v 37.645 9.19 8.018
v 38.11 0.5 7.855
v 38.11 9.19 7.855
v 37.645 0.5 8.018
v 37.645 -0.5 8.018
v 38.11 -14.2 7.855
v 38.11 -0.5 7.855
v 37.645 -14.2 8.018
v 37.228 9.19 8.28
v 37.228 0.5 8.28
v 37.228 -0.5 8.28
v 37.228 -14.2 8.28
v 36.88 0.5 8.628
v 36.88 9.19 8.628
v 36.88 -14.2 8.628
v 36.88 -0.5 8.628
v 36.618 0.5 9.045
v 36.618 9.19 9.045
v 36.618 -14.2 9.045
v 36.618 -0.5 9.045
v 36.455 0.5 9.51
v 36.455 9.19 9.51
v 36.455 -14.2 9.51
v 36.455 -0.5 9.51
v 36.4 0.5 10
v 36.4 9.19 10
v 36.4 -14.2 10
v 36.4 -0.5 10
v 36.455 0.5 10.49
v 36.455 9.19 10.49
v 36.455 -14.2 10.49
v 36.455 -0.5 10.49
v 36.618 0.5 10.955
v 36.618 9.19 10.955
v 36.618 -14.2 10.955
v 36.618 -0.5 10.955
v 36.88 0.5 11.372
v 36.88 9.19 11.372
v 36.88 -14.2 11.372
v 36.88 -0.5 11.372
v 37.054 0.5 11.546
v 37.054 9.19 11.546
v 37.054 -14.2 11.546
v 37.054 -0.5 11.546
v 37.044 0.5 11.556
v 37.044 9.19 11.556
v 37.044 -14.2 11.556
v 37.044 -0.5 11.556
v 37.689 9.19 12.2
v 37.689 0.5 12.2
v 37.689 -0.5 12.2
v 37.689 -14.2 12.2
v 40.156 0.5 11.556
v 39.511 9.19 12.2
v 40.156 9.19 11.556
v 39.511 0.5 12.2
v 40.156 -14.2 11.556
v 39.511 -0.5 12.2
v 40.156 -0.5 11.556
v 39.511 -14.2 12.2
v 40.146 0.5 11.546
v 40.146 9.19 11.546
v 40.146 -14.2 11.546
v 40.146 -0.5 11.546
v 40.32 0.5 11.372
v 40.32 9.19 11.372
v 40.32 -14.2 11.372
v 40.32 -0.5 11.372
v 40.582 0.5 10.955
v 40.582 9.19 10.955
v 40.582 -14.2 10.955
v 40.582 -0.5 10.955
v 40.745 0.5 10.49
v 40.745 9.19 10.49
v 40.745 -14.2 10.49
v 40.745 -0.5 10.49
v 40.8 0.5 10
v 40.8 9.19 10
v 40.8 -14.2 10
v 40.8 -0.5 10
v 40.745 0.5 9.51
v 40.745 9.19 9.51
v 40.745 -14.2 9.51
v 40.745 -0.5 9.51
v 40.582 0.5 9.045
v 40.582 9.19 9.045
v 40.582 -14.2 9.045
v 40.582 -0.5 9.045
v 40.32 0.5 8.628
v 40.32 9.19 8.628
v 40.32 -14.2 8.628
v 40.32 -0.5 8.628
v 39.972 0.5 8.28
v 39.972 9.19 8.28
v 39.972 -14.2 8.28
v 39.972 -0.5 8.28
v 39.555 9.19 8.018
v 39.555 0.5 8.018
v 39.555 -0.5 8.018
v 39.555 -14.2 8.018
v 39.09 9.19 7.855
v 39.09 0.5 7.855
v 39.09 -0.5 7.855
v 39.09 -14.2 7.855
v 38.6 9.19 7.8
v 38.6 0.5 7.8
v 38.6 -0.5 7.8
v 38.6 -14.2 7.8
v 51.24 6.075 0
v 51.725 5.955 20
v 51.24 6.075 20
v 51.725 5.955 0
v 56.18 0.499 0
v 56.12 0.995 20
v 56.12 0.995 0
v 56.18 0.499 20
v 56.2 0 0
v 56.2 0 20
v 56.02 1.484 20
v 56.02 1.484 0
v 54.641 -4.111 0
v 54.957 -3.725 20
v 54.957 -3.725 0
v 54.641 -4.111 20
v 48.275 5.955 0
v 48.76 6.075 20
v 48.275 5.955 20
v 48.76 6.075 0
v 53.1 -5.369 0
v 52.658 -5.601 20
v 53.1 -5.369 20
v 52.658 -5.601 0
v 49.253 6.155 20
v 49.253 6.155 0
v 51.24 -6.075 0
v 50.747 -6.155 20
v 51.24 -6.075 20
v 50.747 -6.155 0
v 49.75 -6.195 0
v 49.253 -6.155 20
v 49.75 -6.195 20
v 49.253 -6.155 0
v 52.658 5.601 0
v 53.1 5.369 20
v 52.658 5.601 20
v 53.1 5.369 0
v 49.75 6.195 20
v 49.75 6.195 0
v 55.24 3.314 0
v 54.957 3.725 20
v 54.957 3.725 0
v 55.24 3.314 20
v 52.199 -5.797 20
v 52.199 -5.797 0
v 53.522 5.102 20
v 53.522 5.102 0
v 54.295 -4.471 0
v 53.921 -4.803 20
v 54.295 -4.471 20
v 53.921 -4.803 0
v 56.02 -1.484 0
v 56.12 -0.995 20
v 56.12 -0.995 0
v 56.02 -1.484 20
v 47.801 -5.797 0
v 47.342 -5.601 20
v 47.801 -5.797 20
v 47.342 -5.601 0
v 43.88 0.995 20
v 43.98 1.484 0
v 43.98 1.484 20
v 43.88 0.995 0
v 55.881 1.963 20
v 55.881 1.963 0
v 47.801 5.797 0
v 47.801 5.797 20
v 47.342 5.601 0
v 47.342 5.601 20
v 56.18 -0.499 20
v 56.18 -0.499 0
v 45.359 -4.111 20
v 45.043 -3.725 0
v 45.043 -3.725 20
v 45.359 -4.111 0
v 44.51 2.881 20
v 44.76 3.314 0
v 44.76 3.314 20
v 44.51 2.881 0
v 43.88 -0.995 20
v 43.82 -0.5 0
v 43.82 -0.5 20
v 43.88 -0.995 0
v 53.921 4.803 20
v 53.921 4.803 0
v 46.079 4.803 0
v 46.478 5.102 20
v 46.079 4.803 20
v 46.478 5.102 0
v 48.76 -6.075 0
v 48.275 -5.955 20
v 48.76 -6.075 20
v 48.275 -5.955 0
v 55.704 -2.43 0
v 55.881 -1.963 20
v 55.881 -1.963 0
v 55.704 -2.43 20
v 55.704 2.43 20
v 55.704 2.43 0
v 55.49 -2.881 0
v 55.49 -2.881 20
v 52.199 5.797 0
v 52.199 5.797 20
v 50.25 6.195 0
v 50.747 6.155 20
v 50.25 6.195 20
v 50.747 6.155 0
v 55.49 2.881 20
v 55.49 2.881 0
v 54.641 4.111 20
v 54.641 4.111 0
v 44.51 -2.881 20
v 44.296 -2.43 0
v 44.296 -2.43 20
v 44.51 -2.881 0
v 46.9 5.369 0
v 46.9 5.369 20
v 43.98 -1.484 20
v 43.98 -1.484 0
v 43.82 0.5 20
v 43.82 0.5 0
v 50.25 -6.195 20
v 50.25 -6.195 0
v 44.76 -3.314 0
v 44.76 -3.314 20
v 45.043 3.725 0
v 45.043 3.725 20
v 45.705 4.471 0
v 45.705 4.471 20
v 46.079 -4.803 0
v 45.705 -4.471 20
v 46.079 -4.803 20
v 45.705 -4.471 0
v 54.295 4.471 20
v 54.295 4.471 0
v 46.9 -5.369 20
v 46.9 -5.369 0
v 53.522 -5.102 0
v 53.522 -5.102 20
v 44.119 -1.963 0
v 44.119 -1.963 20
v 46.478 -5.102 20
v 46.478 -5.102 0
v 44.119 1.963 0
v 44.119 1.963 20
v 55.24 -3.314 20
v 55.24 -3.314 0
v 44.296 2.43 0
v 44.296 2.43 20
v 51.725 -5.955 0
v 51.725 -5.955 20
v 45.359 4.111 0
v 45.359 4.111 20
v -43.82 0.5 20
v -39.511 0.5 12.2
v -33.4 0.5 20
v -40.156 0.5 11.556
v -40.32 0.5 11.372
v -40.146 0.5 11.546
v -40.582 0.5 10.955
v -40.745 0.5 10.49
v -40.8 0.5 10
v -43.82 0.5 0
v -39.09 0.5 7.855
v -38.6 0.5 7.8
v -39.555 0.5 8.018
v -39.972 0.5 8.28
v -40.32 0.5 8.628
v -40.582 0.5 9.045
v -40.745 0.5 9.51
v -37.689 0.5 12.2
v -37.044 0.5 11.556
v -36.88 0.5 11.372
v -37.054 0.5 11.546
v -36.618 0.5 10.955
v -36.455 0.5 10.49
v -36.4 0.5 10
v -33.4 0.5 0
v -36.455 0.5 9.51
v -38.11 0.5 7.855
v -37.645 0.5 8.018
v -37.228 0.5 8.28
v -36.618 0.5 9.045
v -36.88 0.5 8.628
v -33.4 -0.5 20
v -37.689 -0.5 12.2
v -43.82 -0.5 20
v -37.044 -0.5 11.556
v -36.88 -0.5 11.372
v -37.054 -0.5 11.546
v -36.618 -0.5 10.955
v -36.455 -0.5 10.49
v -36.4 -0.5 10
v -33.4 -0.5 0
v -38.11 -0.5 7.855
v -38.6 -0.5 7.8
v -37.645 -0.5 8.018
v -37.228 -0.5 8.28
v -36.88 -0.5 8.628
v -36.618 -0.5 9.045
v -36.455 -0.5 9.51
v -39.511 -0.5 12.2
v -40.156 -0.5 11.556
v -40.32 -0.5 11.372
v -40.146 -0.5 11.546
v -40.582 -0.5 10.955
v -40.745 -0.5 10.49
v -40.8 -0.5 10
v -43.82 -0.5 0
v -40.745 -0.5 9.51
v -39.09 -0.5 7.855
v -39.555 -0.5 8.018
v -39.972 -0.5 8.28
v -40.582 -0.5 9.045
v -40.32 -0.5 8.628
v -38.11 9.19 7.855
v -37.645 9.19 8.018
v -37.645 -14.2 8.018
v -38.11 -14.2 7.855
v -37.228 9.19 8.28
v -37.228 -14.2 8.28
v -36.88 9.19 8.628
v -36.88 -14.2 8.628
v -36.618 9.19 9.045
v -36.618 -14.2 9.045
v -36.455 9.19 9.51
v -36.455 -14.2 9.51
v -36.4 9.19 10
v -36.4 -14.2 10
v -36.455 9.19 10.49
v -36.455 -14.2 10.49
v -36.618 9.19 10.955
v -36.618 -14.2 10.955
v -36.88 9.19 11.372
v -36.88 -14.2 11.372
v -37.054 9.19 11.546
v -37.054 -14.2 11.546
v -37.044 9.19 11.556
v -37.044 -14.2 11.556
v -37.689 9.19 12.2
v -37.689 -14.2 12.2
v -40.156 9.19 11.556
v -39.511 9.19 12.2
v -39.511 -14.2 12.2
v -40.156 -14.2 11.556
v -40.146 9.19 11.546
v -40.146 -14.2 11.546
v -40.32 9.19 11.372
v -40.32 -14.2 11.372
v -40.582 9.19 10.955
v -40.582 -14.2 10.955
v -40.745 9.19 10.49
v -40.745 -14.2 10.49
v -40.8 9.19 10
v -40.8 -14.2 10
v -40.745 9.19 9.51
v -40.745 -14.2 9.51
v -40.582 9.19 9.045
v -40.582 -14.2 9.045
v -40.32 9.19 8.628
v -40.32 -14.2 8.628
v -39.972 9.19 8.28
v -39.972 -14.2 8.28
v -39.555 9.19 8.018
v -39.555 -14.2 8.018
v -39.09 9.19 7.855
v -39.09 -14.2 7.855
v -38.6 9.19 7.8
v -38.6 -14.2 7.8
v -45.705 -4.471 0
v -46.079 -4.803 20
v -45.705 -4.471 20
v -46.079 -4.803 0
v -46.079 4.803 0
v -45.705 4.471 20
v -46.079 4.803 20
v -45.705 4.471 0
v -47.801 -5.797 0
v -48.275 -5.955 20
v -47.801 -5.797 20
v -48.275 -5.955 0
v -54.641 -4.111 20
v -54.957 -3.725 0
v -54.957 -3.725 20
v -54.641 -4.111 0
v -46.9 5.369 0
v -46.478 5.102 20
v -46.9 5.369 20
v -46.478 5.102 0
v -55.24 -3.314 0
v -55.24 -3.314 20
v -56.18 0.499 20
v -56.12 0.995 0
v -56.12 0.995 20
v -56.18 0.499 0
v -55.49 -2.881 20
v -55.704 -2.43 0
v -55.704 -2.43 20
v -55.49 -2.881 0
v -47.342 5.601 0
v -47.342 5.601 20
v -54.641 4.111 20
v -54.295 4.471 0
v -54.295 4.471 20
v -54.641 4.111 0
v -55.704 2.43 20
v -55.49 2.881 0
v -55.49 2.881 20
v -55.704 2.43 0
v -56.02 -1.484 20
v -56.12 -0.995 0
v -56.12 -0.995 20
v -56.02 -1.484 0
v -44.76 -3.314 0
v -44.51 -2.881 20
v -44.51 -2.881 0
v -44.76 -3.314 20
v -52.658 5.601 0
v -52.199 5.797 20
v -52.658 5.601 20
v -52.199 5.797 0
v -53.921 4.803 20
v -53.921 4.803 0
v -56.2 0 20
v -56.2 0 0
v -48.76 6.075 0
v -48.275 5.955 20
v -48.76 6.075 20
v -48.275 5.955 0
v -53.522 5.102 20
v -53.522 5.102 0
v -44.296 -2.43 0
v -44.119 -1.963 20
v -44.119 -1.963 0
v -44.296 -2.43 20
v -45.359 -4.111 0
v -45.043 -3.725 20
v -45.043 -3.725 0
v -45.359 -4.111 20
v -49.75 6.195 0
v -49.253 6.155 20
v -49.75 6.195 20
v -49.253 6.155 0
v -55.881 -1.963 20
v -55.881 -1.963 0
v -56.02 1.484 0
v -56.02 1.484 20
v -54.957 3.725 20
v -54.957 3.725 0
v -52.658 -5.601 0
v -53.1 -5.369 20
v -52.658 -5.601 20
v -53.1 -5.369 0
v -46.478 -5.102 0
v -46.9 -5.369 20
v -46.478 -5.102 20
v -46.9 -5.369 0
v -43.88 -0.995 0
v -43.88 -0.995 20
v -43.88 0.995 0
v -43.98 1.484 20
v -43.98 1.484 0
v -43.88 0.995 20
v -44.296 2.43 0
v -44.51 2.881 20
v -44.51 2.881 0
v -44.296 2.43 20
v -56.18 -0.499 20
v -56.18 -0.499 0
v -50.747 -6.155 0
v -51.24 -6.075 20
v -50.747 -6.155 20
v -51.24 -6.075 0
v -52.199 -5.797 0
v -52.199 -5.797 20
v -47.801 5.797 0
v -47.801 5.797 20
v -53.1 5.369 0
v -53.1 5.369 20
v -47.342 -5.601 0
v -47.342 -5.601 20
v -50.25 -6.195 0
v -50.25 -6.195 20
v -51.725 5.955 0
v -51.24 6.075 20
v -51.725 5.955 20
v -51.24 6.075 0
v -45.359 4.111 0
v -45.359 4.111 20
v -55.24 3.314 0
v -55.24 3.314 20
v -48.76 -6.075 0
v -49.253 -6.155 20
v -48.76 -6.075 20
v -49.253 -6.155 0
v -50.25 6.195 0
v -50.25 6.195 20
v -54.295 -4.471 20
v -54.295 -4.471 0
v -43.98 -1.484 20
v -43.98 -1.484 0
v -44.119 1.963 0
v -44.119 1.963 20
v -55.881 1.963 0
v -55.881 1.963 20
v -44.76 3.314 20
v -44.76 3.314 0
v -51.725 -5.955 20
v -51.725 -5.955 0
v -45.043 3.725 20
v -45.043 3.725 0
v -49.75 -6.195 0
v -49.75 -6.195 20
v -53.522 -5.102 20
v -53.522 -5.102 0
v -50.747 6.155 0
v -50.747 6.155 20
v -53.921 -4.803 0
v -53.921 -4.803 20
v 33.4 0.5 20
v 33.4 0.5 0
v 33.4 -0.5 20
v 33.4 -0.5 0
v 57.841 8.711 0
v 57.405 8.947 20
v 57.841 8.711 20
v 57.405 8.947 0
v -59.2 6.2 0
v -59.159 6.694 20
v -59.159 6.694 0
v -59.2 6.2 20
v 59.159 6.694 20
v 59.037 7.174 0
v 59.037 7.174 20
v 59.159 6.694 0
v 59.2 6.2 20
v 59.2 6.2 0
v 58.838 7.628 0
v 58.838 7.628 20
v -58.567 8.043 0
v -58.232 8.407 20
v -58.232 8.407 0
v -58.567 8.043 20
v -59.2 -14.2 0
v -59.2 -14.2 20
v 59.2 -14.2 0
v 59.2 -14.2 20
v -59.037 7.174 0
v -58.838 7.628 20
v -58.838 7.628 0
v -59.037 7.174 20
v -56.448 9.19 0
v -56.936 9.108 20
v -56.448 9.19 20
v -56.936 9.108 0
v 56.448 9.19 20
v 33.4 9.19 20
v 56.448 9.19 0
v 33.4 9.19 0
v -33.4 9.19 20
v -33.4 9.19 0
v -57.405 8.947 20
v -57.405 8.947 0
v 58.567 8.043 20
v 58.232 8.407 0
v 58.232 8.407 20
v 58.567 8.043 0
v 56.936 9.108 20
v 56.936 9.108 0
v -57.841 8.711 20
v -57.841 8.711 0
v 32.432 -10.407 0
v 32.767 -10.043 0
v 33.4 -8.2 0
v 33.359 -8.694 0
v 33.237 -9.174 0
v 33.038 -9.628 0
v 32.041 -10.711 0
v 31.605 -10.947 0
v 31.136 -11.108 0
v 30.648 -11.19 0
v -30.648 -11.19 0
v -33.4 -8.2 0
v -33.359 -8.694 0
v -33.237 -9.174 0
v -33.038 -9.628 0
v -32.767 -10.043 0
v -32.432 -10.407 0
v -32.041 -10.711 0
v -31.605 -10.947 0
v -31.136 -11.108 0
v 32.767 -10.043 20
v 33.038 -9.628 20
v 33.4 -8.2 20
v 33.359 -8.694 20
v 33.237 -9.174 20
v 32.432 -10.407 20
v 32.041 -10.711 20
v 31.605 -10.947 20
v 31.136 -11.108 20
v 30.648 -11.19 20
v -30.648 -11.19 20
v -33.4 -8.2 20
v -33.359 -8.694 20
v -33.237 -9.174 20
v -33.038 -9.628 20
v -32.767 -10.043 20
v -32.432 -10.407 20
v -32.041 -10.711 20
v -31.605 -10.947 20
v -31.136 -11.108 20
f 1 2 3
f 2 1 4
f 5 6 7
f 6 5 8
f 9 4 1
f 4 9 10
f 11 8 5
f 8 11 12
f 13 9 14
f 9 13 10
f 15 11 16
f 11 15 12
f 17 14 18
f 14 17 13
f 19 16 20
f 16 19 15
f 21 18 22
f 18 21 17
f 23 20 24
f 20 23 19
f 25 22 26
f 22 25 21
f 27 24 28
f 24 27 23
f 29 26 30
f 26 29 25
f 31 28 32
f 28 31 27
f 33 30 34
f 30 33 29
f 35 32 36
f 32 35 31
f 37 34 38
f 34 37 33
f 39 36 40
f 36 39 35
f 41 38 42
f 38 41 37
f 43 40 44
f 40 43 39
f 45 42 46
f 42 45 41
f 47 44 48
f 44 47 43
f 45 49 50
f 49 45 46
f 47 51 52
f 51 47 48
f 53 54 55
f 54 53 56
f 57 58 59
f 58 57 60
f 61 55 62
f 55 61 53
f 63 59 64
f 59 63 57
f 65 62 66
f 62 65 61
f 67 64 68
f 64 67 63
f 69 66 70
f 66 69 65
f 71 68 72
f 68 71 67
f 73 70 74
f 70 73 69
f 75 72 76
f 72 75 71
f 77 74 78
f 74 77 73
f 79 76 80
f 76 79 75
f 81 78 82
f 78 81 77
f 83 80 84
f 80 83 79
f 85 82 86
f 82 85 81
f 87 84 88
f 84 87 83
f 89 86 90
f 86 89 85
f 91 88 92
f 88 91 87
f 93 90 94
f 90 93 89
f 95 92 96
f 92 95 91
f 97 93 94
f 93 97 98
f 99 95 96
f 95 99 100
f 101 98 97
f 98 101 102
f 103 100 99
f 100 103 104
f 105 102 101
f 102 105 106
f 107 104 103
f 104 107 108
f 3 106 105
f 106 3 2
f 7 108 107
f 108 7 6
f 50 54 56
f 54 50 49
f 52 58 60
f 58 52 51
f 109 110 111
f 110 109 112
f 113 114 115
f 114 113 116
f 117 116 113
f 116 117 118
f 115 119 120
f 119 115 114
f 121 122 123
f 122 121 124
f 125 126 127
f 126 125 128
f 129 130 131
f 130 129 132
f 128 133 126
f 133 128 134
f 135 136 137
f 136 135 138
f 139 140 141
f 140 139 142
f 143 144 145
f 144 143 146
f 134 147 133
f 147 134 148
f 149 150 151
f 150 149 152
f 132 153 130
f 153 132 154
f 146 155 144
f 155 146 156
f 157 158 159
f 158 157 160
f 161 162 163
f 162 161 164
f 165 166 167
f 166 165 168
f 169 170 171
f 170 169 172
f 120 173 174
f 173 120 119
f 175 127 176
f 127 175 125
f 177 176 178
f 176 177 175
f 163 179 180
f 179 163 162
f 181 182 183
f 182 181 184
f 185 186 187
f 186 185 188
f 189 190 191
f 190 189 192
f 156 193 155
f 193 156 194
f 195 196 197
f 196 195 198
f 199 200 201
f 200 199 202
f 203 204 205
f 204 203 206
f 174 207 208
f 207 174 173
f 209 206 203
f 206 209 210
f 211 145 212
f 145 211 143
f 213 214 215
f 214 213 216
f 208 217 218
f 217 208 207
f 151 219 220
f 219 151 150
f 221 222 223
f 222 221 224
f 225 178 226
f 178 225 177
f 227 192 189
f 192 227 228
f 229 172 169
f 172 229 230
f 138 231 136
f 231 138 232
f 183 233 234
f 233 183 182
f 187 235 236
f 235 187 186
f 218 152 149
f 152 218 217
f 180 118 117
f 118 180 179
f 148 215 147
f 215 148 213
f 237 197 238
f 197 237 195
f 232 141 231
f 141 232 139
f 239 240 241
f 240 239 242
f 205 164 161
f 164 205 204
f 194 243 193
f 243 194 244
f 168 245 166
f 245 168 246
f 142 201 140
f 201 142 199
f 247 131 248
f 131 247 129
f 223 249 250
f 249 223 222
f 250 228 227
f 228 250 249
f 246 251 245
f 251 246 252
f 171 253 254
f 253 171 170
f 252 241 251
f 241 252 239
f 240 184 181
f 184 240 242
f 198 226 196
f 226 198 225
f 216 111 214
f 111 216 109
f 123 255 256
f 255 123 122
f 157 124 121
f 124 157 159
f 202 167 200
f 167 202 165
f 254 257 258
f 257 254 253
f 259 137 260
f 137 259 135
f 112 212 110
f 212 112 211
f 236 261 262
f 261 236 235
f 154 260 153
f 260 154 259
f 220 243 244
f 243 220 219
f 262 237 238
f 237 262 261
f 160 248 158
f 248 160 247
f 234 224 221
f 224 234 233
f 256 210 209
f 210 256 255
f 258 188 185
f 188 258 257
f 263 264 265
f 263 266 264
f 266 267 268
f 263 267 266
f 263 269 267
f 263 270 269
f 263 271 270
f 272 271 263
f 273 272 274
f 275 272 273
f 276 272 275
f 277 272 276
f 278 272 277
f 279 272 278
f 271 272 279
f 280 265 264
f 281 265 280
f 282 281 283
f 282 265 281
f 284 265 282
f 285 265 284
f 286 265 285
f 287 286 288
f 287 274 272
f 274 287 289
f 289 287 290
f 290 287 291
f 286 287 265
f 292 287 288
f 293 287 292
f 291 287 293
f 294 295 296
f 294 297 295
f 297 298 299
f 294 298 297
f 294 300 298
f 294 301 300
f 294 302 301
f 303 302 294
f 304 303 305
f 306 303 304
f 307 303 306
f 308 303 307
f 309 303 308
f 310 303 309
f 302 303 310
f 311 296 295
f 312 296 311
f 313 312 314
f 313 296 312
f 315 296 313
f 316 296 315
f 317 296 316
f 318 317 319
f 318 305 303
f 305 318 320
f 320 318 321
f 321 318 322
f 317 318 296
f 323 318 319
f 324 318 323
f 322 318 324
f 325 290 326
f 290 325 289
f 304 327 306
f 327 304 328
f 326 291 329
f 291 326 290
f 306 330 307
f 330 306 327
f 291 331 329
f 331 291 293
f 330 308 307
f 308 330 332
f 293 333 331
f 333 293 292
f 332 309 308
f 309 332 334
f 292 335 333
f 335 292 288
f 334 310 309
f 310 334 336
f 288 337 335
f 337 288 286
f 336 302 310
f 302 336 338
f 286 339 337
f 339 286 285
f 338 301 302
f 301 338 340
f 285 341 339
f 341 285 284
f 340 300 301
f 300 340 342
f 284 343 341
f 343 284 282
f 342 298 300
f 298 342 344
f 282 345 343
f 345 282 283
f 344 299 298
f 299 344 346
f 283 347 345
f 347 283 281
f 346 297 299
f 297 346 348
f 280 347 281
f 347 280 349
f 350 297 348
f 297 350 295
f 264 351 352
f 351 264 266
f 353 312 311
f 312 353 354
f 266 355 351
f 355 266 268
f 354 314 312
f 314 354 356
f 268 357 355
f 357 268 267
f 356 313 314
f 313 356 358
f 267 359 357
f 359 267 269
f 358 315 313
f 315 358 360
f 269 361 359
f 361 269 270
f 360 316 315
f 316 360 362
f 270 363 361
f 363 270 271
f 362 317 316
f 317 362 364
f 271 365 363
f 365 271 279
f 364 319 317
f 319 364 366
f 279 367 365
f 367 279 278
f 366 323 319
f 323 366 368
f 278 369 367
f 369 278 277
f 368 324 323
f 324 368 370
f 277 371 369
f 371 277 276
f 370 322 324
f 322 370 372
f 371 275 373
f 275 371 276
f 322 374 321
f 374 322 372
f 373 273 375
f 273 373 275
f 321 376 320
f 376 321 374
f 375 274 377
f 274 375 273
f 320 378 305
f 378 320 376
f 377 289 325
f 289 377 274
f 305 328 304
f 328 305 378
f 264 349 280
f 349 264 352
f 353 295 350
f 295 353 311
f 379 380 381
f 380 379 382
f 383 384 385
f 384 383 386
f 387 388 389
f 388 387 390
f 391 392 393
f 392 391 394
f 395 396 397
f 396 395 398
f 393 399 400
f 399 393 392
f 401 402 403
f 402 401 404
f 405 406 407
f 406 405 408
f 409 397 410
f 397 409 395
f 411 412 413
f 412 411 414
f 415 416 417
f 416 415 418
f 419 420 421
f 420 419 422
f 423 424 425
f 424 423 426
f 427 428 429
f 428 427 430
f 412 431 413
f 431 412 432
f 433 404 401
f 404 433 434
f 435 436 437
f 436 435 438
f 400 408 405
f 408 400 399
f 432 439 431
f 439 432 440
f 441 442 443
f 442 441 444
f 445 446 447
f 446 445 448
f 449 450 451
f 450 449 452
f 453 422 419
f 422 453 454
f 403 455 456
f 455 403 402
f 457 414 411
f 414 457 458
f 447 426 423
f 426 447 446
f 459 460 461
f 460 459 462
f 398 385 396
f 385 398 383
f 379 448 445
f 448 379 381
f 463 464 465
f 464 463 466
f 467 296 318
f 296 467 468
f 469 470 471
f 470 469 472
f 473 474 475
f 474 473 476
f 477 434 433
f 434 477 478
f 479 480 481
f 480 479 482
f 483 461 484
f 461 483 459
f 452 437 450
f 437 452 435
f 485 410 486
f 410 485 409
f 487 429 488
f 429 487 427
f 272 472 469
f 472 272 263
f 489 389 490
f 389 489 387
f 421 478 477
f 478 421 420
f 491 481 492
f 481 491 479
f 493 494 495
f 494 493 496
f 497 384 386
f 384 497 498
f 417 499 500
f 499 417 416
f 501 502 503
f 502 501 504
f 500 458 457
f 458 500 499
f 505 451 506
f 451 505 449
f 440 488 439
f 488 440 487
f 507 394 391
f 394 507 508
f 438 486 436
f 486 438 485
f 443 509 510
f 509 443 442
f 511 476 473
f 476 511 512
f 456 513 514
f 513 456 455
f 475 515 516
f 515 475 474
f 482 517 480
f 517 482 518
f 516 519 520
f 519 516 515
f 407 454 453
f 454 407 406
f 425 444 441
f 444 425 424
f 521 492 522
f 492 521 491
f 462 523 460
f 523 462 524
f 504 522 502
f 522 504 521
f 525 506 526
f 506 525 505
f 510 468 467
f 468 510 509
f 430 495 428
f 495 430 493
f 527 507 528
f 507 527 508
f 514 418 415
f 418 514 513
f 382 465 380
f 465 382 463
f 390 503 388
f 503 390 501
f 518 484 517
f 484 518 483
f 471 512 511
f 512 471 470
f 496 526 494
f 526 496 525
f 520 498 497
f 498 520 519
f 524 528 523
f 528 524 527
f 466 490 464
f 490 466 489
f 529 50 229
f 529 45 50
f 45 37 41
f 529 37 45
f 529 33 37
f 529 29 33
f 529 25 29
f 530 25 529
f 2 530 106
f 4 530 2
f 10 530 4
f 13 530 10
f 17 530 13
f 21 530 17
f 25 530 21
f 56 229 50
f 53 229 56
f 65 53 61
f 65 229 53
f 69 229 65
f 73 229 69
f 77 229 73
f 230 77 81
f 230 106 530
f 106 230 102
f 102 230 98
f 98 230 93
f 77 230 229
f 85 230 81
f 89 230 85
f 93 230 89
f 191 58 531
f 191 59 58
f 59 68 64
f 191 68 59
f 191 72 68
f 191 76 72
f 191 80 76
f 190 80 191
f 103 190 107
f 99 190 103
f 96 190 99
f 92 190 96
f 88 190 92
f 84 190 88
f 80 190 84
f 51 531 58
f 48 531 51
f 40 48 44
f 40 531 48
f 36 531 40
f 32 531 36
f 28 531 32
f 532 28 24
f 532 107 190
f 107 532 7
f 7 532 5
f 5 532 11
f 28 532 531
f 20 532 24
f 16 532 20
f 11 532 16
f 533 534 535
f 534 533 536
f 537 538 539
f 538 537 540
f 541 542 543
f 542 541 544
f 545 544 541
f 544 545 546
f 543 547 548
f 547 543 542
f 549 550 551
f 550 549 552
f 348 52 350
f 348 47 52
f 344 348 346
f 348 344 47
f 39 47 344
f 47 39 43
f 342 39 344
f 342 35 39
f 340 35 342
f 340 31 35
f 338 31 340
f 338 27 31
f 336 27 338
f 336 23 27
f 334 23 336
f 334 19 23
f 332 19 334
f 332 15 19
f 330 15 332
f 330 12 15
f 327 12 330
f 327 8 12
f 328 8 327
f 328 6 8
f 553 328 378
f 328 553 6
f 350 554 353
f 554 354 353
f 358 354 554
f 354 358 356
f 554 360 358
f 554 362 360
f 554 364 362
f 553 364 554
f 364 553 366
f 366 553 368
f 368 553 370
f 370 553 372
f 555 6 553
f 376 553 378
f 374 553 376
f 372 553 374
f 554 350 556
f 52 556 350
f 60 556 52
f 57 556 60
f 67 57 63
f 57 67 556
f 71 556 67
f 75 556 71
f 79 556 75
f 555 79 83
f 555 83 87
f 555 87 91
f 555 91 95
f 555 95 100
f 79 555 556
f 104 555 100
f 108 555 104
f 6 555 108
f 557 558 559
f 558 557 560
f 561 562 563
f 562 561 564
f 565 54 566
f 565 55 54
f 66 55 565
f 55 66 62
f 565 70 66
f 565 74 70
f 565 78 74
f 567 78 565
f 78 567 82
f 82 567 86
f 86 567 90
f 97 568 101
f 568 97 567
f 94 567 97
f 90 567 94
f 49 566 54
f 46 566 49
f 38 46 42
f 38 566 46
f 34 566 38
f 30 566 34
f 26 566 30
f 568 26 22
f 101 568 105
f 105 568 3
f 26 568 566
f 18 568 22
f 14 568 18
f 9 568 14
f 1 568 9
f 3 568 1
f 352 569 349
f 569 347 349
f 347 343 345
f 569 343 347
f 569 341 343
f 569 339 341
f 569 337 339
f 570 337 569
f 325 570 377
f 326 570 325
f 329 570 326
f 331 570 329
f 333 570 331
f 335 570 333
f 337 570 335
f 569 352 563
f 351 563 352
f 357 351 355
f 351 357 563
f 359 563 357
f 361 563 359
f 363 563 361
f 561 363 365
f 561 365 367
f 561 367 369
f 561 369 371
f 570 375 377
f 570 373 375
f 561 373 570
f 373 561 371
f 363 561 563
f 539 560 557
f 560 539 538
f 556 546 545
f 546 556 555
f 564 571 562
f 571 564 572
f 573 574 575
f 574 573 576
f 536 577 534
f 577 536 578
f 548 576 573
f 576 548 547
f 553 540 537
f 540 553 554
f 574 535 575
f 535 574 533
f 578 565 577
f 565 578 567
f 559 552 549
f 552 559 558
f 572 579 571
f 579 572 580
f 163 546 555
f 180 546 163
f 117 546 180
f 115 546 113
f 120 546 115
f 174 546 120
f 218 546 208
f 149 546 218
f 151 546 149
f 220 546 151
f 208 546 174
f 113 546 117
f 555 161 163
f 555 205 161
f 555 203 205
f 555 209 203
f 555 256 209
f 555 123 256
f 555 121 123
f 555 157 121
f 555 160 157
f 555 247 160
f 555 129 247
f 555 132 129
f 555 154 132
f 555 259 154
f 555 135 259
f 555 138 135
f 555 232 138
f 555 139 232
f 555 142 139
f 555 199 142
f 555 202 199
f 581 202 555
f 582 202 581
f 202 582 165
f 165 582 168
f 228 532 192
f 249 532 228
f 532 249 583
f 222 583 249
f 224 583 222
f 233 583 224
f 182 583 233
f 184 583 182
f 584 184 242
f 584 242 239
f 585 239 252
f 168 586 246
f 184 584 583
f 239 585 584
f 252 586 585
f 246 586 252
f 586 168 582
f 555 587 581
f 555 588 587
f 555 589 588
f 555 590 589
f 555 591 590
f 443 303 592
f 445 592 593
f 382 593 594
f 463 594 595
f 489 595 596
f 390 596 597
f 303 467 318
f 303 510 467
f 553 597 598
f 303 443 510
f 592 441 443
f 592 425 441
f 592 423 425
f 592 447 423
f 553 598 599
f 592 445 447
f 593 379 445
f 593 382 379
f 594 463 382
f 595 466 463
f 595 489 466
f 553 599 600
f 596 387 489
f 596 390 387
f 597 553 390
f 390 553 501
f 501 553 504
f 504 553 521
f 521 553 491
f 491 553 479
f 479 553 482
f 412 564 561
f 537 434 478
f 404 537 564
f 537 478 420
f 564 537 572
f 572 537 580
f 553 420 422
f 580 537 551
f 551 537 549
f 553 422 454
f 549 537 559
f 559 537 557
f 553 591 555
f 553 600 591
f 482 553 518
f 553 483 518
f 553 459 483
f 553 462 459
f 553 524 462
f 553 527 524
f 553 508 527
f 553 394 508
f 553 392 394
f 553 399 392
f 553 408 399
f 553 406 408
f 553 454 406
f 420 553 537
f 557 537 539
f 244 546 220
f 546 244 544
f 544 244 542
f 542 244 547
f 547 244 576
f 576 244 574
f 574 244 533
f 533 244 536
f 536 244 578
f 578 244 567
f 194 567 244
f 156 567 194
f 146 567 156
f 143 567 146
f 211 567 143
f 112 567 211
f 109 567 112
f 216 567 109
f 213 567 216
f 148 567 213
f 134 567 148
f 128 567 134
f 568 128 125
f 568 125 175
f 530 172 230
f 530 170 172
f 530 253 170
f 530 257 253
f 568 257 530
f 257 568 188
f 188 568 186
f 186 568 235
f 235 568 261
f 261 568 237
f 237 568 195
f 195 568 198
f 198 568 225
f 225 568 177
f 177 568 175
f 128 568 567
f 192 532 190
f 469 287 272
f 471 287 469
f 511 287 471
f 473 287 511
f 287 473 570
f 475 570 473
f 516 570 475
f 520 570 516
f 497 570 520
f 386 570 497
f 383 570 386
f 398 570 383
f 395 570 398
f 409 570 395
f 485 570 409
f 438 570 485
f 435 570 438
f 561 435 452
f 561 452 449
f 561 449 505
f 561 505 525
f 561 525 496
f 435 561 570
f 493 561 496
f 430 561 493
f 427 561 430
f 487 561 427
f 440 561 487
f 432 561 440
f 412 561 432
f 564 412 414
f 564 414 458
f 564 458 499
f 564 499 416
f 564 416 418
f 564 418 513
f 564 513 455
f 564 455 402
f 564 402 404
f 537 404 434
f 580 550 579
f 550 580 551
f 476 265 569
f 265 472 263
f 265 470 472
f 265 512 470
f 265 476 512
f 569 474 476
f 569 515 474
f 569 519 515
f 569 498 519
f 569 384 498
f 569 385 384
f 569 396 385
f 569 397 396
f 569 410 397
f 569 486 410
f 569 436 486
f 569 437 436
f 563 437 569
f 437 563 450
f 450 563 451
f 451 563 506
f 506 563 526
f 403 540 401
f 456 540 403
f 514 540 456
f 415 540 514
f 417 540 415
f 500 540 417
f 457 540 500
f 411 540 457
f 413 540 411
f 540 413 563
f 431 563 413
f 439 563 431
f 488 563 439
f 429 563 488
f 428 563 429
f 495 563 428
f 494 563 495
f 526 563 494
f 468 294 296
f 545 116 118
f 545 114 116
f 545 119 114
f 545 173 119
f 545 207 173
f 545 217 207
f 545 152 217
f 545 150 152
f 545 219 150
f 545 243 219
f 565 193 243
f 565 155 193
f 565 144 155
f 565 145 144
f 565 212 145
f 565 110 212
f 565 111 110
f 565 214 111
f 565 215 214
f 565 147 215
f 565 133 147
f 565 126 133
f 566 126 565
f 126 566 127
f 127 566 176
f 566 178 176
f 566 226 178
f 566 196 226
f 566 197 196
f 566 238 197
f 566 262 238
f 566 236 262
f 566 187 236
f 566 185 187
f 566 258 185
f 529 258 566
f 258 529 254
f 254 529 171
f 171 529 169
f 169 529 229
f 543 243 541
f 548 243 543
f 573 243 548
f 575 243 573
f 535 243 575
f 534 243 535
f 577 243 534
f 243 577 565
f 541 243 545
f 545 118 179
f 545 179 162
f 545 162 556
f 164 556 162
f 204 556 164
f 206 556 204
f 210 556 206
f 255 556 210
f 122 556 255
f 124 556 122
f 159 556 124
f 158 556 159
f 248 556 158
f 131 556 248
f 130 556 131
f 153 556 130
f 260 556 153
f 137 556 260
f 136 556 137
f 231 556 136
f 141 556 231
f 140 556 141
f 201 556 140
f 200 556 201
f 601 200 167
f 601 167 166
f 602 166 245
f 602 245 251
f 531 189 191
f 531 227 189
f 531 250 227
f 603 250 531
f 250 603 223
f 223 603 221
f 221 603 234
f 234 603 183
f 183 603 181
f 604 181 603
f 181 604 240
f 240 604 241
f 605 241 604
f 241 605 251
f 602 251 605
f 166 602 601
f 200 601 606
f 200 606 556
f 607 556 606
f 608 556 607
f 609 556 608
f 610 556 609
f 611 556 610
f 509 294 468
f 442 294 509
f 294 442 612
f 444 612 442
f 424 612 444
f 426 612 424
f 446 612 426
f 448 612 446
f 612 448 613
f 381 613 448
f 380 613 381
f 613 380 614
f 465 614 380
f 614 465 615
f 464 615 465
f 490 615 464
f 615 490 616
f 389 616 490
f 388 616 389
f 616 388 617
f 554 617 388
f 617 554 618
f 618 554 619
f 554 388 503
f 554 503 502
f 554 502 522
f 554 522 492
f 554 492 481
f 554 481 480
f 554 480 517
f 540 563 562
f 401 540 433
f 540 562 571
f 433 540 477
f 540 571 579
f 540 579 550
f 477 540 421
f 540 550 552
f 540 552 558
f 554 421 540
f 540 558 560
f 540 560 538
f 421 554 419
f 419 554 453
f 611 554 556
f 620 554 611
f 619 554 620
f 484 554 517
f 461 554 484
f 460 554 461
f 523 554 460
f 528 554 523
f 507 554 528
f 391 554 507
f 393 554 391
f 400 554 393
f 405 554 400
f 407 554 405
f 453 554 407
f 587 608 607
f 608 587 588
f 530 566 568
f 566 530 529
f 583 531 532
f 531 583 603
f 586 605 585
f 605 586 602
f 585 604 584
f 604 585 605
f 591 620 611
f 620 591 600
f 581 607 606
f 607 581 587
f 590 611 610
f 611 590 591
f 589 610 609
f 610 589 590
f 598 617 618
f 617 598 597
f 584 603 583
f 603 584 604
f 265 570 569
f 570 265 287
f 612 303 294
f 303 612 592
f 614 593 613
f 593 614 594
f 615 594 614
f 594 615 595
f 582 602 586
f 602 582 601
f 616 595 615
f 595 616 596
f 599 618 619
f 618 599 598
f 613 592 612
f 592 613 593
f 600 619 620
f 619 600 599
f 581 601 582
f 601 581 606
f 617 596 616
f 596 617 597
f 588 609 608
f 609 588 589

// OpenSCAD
// file: functions.scad
/*******************************************************************

This OpenSCAD code and its rendered 3D model are part of the

	Kühling&Kühling RepRap Industrial 3D Printer


All details, BOM, assembling instructions and latest sources:
	http://kuehlingkuehling.de

Designed and developed by:
	Jonas Kühling <mail@jonaskuehling.de>
	Simon Kühling <mail@simonkuehling.de>

Licensed under:
	Creative Commons Attribution-ShareAlike
	CC BY-SA 3.0
	http://creativecommons.org/licenses/by-sa/3.0/

*******************************************************************/

module teardrop (r=4.5,h=20,alpha=45,teardropcorner=0,fulldrop=0){		// tear drop hole for top-centering
											// use teardropcorner=1 for bottom horizontal corners
	render()
	translate([-h/2,0,0])
		rotate([-270,0+(teardropcorner*180),90])
			difference(){
				linear_extrude(height=h){
					circle(r);
					polygon(points=[[0,0],[r*cos(alpha),r*sin(alpha)],[0,r/sin(alpha)],[-r*cos(alpha),r*sin(alpha)]], paths=[[0,1,2,3]]);
				}
				if(fulldrop==0) 
					translate([0,(r/sin(alpha))/2+r,h/2]) cube([2*r+2,r/sin(alpha),h+2],center=true);
			}
}

//teardrop(4.5,22,fulldrop=true);



module teardropcentering (r=4.5,h=20,alpha=45){				// tear drop hole for top-centering
	centering_offset_factor = 1.1;
	render()
	translate([-h/2,0,0])
		rotate([-270,0,90])
			difference(){
				linear_extrude(height=h){
					circle(r, $fn=24);
					polygon(points=[[0,0],[r*cos(alpha),r*sin(alpha)],[0,r/sin(alpha)],[-r*cos(alpha),r*sin(alpha)]], paths=[[0,1,2,3]]);
				}
				translate([0,(r/sin(alpha))/2+r*centering_offset_factor,h/2]) cube([2*r+2,r/sin(alpha),h+2],center=true);
			}
}

//teardropcentering();



module teardropcentering_half (r=4.5,h=20, bottom=0,alpha=45){				// tear drop hole for top-centering
																// upper half (bottom=0) or bottom half (bottom=1)
	centering_offset_factor = 1.2;
	render()
	translate([-h/2,0,0])
		rotate([-270,0,90])
			difference(){
				linear_extrude(height=h){
					circle(r, $fn=24);
					polygon(points=[[0,0],[r*cos(alpha),r*sin(alpha)],[0,r/sin(alpha)],[-r*cos(alpha),r*sin(alpha)]], paths=[[0,1,2,3]]);
				}
				translate([0,(r/sin(alpha))/2+r*centering_offset_factor,h/2]) cube([2*r+2,r/sin(alpha),h+2],center=true);
				translate([0,-(r*centering_offset_factor)/2-0.5+bottom*(r*centering_offset_factor+1),h/2]) cube([2*r+2,r*centering_offset_factor+1,h+2],center=true);
			}
}

//teardropcentering_half(bottom=0);


module polyhole(d,h){
	n = max(round(2 * d),3);
	cylinder(h = h, r = (d / 2) / cos (180 / n), $fn = n, center=true);
}



module roundcorner(radius,edge_length){
	render()
	translate([0,0,-1])
		difference(){
			translate([-1,-1,0])
				cube(size = [radius+1,radius+1,edge_length+2], center = false);
			translate(v = [radius,radius,-1])
				cylinder(h = edge_length+4, r=radius, center=false,$fs=0.1);
		}
}

//roundcorner(5,5);



module roundcorner_tear(radius,edge_length){
	render()
	difference(){
		translate([-1,-1,-1])
			cube(size = [edge_length+2, radius+1, radius+1], center = false);
		translate([(edge_length+4)/2-2, radius, radius])
			teardrop(radius, edge_length+4,teardropcorner=1);
	}
}

//roundcorner_tear(8,20);


module roundedge_tear(radius){
	render()
	difference(){
		translate([-1,-1,-1])
			cube(size = [radius+1, radius+1, radius+1], center = false);
		translate([radius,radius,radius])
			union(){
				sphere(r=radius, $fs=0.1);
				translate([0,0,-radius])
					cylinder(r1=(radius*sin(45))-(radius-(radius*sin(45))),r2=radius*sin(45),h=(radius-(radius*sin(45))), $fs=0.1);
			}
	}
}

//roundedge_tear(20);



module roundedge(radius){
	render()
	difference(){
		translate([-1,-1,-1])
			cube(size = [radius+1, radius+1, radius+1], center = false);
		translate([radius,radius,radius])
			sphere(r=radius, $fs=0.1);
	}
}

//roundedge(5);


module nut_trap(nut_wrench_size,trap_height,vertical=0, clearance=0.2,center=true){		// M3 wrench size = 5.5
	radius = cornerdiameter(nut_wrench_size+2*clearance) /2;
	rotate([0,vertical*90,0])
		cylinder(h = trap_height, r = radius, center=center, $fn = 6);
}

//nut_trap(5,5,0);

module nut_slot(nut_wrench_size,nut_height, nut_elevation,vertical=0, clearance=0.2){		// M3 wrench size = 5.5
	radius = cornerdiameter(nut_wrench_size+2*clearance) /2;
	slot_height = nut_height+2*clearance;
	slot_width = nut_wrench_size+2*clearance;
	rotate([0,vertical*270,0]){
		cylinder(h = slot_height, r = radius, center=true, $fn = 6);
		translate([0,-slot_width/2,-slot_height/2]) cube([nut_elevation+1,slot_width,slot_height]);
	}
}

//nut_slot(5.5,3,4,1);

function cornerdiameter(wrench_size) =  2* ((wrench_size)/2)/ cos(180/6);
function cornerdiameter_8(wrench_size) =  2* ((wrench_size)/2)/ cos(180/8);
// main file
/*******************************************************************

This OpenSCAD code and its rendered 3D model are part of the

	Kühling&Kühling RepRap Industrial 3D Printer


All details, BOM, assembling instructions and latest sources:
	http://kuehlingkuehling.de

Designed and developed by:
	Jonas Kühling <mail@jonaskuehling.de>
	Simon Kühling <mail@simonkuehling.de>

Licensed under:
	Creative Commons Attribution-ShareAlike
	CC BY-SA 3.0
	http://creativecommons.org/licenses/by-sa/3.0/

*******************************************************************/

include <configuration.scad>


///// RENDER Z-TOP /////
//z_top(0);


//// RENDER Z-MIDDLE /////
z_top_body_height = frame_width;
z_top(1);



module z_top(middle=0){

	difference(){

		// main body
		union(){
			translate([-z_top_body_width/2,-z_rod_frame_enclosure_dist-frame_enclosure_thickness+frame_width+clearance,0])	
				hull(){
					translate([0,0,0])
						cube([wall,wall,z_top_body_height]);
					translate([wall,z_top_body_length-wall,0])
						cylinder(r=wall,h=z_top_body_height);
					translate([z_top_body_width-wall,0,0])
						cube([wall,wall,z_top_body_height]);
					translate([z_top_body_width-wall,z_top_body_length-wall,0])
						cylinder(r=wall,h=z_top_body_height);
				}
		}

		// rod clamps
		for(i=[0,1])
			mirror([i,0,0]){
				translate([z_rod_dist/2,0,-1])
					cylinder(r=rod_dia/2+clearance,h=z_top_body_height+2);
				translate([z_rod_dist/2-rod_dia/2-clearance-wall-clearance-frame_screw_dia/2,z_top_body_length/2-z_rod_frame_enclosure_dist-frame_enclosure_thickness+frame_width+clearance,frame_width/2])
					rotate([0,0,90])
							teardrop(frame_screw_dia/2+clearance,z_top_body_length+2);
				translate([-z_rod_dist/2,-wall_thin/2,-1])
					cube([rod_dia/2+clearance+wall+2*clearance+frame_screw_dia+frame_washer_wall+wall_thin,wall_thin,z_top_body_height+2]);
/*
				translate([-z_rod_dist/2+(rod_dia/2+clearance+wall+2*clearance+frame_screw_dia+frame_washer_wall),-wall_thin/2,-1])
%					cube([z_rod_dist/2-rod_dia/2-clearance-wall-2*clearance-frame_screw_dia-frame_washer_wall+1,rod_dia/2+clearance+wall+1,z_top_body_height+2]);
*/

			}

			// body cutoff
			hull(){
				translate([z_rod_dist/2-rod_dia/2-clearance-wall-frame_screw_dia-2*clearance-frame_washer_wall-wall,rod_dia/2+clearance+1,-1])
					cube([wall,wall,z_top_body_height+2]);
				translate([-(z_rod_dist/2-rod_dia/2-clearance-wall-frame_screw_dia-2*clearance-frame_washer_wall),rod_dia/2+clearance+1,-1])
					cube([wall,wall,z_top_body_height+2]);
				translate([z_rod_dist/2-rod_dia/2-clearance-wall-frame_screw_dia-2*clearance-frame_washer_wall-wall,-(z_top_body_length-rod_dia/2-clearance-wall)+2*wall,-1])
					cylinder(r=wall,h=z_top_body_height+2);
				translate([-(z_rod_dist/2-rod_dia/2-clearance-wall-frame_screw_dia-2*clearance-frame_washer_wall-wall),-(z_top_body_length-rod_dia/2-clearance-wall)+2*wall,-1])
					cylinder(r=wall,h=z_top_body_height+2);
			}


		// frame screw hole
		if(middle==0)
			translate([0,z_top_body_length/2-z_rod_frame_enclosure_dist-frame_enclosure_thickness+frame_width+clearance,frame_width/2])
				rotate([0,0,90])
						teardrop(frame_screw_dia/2+clearance,z_top_body_length+2);
	}
}
